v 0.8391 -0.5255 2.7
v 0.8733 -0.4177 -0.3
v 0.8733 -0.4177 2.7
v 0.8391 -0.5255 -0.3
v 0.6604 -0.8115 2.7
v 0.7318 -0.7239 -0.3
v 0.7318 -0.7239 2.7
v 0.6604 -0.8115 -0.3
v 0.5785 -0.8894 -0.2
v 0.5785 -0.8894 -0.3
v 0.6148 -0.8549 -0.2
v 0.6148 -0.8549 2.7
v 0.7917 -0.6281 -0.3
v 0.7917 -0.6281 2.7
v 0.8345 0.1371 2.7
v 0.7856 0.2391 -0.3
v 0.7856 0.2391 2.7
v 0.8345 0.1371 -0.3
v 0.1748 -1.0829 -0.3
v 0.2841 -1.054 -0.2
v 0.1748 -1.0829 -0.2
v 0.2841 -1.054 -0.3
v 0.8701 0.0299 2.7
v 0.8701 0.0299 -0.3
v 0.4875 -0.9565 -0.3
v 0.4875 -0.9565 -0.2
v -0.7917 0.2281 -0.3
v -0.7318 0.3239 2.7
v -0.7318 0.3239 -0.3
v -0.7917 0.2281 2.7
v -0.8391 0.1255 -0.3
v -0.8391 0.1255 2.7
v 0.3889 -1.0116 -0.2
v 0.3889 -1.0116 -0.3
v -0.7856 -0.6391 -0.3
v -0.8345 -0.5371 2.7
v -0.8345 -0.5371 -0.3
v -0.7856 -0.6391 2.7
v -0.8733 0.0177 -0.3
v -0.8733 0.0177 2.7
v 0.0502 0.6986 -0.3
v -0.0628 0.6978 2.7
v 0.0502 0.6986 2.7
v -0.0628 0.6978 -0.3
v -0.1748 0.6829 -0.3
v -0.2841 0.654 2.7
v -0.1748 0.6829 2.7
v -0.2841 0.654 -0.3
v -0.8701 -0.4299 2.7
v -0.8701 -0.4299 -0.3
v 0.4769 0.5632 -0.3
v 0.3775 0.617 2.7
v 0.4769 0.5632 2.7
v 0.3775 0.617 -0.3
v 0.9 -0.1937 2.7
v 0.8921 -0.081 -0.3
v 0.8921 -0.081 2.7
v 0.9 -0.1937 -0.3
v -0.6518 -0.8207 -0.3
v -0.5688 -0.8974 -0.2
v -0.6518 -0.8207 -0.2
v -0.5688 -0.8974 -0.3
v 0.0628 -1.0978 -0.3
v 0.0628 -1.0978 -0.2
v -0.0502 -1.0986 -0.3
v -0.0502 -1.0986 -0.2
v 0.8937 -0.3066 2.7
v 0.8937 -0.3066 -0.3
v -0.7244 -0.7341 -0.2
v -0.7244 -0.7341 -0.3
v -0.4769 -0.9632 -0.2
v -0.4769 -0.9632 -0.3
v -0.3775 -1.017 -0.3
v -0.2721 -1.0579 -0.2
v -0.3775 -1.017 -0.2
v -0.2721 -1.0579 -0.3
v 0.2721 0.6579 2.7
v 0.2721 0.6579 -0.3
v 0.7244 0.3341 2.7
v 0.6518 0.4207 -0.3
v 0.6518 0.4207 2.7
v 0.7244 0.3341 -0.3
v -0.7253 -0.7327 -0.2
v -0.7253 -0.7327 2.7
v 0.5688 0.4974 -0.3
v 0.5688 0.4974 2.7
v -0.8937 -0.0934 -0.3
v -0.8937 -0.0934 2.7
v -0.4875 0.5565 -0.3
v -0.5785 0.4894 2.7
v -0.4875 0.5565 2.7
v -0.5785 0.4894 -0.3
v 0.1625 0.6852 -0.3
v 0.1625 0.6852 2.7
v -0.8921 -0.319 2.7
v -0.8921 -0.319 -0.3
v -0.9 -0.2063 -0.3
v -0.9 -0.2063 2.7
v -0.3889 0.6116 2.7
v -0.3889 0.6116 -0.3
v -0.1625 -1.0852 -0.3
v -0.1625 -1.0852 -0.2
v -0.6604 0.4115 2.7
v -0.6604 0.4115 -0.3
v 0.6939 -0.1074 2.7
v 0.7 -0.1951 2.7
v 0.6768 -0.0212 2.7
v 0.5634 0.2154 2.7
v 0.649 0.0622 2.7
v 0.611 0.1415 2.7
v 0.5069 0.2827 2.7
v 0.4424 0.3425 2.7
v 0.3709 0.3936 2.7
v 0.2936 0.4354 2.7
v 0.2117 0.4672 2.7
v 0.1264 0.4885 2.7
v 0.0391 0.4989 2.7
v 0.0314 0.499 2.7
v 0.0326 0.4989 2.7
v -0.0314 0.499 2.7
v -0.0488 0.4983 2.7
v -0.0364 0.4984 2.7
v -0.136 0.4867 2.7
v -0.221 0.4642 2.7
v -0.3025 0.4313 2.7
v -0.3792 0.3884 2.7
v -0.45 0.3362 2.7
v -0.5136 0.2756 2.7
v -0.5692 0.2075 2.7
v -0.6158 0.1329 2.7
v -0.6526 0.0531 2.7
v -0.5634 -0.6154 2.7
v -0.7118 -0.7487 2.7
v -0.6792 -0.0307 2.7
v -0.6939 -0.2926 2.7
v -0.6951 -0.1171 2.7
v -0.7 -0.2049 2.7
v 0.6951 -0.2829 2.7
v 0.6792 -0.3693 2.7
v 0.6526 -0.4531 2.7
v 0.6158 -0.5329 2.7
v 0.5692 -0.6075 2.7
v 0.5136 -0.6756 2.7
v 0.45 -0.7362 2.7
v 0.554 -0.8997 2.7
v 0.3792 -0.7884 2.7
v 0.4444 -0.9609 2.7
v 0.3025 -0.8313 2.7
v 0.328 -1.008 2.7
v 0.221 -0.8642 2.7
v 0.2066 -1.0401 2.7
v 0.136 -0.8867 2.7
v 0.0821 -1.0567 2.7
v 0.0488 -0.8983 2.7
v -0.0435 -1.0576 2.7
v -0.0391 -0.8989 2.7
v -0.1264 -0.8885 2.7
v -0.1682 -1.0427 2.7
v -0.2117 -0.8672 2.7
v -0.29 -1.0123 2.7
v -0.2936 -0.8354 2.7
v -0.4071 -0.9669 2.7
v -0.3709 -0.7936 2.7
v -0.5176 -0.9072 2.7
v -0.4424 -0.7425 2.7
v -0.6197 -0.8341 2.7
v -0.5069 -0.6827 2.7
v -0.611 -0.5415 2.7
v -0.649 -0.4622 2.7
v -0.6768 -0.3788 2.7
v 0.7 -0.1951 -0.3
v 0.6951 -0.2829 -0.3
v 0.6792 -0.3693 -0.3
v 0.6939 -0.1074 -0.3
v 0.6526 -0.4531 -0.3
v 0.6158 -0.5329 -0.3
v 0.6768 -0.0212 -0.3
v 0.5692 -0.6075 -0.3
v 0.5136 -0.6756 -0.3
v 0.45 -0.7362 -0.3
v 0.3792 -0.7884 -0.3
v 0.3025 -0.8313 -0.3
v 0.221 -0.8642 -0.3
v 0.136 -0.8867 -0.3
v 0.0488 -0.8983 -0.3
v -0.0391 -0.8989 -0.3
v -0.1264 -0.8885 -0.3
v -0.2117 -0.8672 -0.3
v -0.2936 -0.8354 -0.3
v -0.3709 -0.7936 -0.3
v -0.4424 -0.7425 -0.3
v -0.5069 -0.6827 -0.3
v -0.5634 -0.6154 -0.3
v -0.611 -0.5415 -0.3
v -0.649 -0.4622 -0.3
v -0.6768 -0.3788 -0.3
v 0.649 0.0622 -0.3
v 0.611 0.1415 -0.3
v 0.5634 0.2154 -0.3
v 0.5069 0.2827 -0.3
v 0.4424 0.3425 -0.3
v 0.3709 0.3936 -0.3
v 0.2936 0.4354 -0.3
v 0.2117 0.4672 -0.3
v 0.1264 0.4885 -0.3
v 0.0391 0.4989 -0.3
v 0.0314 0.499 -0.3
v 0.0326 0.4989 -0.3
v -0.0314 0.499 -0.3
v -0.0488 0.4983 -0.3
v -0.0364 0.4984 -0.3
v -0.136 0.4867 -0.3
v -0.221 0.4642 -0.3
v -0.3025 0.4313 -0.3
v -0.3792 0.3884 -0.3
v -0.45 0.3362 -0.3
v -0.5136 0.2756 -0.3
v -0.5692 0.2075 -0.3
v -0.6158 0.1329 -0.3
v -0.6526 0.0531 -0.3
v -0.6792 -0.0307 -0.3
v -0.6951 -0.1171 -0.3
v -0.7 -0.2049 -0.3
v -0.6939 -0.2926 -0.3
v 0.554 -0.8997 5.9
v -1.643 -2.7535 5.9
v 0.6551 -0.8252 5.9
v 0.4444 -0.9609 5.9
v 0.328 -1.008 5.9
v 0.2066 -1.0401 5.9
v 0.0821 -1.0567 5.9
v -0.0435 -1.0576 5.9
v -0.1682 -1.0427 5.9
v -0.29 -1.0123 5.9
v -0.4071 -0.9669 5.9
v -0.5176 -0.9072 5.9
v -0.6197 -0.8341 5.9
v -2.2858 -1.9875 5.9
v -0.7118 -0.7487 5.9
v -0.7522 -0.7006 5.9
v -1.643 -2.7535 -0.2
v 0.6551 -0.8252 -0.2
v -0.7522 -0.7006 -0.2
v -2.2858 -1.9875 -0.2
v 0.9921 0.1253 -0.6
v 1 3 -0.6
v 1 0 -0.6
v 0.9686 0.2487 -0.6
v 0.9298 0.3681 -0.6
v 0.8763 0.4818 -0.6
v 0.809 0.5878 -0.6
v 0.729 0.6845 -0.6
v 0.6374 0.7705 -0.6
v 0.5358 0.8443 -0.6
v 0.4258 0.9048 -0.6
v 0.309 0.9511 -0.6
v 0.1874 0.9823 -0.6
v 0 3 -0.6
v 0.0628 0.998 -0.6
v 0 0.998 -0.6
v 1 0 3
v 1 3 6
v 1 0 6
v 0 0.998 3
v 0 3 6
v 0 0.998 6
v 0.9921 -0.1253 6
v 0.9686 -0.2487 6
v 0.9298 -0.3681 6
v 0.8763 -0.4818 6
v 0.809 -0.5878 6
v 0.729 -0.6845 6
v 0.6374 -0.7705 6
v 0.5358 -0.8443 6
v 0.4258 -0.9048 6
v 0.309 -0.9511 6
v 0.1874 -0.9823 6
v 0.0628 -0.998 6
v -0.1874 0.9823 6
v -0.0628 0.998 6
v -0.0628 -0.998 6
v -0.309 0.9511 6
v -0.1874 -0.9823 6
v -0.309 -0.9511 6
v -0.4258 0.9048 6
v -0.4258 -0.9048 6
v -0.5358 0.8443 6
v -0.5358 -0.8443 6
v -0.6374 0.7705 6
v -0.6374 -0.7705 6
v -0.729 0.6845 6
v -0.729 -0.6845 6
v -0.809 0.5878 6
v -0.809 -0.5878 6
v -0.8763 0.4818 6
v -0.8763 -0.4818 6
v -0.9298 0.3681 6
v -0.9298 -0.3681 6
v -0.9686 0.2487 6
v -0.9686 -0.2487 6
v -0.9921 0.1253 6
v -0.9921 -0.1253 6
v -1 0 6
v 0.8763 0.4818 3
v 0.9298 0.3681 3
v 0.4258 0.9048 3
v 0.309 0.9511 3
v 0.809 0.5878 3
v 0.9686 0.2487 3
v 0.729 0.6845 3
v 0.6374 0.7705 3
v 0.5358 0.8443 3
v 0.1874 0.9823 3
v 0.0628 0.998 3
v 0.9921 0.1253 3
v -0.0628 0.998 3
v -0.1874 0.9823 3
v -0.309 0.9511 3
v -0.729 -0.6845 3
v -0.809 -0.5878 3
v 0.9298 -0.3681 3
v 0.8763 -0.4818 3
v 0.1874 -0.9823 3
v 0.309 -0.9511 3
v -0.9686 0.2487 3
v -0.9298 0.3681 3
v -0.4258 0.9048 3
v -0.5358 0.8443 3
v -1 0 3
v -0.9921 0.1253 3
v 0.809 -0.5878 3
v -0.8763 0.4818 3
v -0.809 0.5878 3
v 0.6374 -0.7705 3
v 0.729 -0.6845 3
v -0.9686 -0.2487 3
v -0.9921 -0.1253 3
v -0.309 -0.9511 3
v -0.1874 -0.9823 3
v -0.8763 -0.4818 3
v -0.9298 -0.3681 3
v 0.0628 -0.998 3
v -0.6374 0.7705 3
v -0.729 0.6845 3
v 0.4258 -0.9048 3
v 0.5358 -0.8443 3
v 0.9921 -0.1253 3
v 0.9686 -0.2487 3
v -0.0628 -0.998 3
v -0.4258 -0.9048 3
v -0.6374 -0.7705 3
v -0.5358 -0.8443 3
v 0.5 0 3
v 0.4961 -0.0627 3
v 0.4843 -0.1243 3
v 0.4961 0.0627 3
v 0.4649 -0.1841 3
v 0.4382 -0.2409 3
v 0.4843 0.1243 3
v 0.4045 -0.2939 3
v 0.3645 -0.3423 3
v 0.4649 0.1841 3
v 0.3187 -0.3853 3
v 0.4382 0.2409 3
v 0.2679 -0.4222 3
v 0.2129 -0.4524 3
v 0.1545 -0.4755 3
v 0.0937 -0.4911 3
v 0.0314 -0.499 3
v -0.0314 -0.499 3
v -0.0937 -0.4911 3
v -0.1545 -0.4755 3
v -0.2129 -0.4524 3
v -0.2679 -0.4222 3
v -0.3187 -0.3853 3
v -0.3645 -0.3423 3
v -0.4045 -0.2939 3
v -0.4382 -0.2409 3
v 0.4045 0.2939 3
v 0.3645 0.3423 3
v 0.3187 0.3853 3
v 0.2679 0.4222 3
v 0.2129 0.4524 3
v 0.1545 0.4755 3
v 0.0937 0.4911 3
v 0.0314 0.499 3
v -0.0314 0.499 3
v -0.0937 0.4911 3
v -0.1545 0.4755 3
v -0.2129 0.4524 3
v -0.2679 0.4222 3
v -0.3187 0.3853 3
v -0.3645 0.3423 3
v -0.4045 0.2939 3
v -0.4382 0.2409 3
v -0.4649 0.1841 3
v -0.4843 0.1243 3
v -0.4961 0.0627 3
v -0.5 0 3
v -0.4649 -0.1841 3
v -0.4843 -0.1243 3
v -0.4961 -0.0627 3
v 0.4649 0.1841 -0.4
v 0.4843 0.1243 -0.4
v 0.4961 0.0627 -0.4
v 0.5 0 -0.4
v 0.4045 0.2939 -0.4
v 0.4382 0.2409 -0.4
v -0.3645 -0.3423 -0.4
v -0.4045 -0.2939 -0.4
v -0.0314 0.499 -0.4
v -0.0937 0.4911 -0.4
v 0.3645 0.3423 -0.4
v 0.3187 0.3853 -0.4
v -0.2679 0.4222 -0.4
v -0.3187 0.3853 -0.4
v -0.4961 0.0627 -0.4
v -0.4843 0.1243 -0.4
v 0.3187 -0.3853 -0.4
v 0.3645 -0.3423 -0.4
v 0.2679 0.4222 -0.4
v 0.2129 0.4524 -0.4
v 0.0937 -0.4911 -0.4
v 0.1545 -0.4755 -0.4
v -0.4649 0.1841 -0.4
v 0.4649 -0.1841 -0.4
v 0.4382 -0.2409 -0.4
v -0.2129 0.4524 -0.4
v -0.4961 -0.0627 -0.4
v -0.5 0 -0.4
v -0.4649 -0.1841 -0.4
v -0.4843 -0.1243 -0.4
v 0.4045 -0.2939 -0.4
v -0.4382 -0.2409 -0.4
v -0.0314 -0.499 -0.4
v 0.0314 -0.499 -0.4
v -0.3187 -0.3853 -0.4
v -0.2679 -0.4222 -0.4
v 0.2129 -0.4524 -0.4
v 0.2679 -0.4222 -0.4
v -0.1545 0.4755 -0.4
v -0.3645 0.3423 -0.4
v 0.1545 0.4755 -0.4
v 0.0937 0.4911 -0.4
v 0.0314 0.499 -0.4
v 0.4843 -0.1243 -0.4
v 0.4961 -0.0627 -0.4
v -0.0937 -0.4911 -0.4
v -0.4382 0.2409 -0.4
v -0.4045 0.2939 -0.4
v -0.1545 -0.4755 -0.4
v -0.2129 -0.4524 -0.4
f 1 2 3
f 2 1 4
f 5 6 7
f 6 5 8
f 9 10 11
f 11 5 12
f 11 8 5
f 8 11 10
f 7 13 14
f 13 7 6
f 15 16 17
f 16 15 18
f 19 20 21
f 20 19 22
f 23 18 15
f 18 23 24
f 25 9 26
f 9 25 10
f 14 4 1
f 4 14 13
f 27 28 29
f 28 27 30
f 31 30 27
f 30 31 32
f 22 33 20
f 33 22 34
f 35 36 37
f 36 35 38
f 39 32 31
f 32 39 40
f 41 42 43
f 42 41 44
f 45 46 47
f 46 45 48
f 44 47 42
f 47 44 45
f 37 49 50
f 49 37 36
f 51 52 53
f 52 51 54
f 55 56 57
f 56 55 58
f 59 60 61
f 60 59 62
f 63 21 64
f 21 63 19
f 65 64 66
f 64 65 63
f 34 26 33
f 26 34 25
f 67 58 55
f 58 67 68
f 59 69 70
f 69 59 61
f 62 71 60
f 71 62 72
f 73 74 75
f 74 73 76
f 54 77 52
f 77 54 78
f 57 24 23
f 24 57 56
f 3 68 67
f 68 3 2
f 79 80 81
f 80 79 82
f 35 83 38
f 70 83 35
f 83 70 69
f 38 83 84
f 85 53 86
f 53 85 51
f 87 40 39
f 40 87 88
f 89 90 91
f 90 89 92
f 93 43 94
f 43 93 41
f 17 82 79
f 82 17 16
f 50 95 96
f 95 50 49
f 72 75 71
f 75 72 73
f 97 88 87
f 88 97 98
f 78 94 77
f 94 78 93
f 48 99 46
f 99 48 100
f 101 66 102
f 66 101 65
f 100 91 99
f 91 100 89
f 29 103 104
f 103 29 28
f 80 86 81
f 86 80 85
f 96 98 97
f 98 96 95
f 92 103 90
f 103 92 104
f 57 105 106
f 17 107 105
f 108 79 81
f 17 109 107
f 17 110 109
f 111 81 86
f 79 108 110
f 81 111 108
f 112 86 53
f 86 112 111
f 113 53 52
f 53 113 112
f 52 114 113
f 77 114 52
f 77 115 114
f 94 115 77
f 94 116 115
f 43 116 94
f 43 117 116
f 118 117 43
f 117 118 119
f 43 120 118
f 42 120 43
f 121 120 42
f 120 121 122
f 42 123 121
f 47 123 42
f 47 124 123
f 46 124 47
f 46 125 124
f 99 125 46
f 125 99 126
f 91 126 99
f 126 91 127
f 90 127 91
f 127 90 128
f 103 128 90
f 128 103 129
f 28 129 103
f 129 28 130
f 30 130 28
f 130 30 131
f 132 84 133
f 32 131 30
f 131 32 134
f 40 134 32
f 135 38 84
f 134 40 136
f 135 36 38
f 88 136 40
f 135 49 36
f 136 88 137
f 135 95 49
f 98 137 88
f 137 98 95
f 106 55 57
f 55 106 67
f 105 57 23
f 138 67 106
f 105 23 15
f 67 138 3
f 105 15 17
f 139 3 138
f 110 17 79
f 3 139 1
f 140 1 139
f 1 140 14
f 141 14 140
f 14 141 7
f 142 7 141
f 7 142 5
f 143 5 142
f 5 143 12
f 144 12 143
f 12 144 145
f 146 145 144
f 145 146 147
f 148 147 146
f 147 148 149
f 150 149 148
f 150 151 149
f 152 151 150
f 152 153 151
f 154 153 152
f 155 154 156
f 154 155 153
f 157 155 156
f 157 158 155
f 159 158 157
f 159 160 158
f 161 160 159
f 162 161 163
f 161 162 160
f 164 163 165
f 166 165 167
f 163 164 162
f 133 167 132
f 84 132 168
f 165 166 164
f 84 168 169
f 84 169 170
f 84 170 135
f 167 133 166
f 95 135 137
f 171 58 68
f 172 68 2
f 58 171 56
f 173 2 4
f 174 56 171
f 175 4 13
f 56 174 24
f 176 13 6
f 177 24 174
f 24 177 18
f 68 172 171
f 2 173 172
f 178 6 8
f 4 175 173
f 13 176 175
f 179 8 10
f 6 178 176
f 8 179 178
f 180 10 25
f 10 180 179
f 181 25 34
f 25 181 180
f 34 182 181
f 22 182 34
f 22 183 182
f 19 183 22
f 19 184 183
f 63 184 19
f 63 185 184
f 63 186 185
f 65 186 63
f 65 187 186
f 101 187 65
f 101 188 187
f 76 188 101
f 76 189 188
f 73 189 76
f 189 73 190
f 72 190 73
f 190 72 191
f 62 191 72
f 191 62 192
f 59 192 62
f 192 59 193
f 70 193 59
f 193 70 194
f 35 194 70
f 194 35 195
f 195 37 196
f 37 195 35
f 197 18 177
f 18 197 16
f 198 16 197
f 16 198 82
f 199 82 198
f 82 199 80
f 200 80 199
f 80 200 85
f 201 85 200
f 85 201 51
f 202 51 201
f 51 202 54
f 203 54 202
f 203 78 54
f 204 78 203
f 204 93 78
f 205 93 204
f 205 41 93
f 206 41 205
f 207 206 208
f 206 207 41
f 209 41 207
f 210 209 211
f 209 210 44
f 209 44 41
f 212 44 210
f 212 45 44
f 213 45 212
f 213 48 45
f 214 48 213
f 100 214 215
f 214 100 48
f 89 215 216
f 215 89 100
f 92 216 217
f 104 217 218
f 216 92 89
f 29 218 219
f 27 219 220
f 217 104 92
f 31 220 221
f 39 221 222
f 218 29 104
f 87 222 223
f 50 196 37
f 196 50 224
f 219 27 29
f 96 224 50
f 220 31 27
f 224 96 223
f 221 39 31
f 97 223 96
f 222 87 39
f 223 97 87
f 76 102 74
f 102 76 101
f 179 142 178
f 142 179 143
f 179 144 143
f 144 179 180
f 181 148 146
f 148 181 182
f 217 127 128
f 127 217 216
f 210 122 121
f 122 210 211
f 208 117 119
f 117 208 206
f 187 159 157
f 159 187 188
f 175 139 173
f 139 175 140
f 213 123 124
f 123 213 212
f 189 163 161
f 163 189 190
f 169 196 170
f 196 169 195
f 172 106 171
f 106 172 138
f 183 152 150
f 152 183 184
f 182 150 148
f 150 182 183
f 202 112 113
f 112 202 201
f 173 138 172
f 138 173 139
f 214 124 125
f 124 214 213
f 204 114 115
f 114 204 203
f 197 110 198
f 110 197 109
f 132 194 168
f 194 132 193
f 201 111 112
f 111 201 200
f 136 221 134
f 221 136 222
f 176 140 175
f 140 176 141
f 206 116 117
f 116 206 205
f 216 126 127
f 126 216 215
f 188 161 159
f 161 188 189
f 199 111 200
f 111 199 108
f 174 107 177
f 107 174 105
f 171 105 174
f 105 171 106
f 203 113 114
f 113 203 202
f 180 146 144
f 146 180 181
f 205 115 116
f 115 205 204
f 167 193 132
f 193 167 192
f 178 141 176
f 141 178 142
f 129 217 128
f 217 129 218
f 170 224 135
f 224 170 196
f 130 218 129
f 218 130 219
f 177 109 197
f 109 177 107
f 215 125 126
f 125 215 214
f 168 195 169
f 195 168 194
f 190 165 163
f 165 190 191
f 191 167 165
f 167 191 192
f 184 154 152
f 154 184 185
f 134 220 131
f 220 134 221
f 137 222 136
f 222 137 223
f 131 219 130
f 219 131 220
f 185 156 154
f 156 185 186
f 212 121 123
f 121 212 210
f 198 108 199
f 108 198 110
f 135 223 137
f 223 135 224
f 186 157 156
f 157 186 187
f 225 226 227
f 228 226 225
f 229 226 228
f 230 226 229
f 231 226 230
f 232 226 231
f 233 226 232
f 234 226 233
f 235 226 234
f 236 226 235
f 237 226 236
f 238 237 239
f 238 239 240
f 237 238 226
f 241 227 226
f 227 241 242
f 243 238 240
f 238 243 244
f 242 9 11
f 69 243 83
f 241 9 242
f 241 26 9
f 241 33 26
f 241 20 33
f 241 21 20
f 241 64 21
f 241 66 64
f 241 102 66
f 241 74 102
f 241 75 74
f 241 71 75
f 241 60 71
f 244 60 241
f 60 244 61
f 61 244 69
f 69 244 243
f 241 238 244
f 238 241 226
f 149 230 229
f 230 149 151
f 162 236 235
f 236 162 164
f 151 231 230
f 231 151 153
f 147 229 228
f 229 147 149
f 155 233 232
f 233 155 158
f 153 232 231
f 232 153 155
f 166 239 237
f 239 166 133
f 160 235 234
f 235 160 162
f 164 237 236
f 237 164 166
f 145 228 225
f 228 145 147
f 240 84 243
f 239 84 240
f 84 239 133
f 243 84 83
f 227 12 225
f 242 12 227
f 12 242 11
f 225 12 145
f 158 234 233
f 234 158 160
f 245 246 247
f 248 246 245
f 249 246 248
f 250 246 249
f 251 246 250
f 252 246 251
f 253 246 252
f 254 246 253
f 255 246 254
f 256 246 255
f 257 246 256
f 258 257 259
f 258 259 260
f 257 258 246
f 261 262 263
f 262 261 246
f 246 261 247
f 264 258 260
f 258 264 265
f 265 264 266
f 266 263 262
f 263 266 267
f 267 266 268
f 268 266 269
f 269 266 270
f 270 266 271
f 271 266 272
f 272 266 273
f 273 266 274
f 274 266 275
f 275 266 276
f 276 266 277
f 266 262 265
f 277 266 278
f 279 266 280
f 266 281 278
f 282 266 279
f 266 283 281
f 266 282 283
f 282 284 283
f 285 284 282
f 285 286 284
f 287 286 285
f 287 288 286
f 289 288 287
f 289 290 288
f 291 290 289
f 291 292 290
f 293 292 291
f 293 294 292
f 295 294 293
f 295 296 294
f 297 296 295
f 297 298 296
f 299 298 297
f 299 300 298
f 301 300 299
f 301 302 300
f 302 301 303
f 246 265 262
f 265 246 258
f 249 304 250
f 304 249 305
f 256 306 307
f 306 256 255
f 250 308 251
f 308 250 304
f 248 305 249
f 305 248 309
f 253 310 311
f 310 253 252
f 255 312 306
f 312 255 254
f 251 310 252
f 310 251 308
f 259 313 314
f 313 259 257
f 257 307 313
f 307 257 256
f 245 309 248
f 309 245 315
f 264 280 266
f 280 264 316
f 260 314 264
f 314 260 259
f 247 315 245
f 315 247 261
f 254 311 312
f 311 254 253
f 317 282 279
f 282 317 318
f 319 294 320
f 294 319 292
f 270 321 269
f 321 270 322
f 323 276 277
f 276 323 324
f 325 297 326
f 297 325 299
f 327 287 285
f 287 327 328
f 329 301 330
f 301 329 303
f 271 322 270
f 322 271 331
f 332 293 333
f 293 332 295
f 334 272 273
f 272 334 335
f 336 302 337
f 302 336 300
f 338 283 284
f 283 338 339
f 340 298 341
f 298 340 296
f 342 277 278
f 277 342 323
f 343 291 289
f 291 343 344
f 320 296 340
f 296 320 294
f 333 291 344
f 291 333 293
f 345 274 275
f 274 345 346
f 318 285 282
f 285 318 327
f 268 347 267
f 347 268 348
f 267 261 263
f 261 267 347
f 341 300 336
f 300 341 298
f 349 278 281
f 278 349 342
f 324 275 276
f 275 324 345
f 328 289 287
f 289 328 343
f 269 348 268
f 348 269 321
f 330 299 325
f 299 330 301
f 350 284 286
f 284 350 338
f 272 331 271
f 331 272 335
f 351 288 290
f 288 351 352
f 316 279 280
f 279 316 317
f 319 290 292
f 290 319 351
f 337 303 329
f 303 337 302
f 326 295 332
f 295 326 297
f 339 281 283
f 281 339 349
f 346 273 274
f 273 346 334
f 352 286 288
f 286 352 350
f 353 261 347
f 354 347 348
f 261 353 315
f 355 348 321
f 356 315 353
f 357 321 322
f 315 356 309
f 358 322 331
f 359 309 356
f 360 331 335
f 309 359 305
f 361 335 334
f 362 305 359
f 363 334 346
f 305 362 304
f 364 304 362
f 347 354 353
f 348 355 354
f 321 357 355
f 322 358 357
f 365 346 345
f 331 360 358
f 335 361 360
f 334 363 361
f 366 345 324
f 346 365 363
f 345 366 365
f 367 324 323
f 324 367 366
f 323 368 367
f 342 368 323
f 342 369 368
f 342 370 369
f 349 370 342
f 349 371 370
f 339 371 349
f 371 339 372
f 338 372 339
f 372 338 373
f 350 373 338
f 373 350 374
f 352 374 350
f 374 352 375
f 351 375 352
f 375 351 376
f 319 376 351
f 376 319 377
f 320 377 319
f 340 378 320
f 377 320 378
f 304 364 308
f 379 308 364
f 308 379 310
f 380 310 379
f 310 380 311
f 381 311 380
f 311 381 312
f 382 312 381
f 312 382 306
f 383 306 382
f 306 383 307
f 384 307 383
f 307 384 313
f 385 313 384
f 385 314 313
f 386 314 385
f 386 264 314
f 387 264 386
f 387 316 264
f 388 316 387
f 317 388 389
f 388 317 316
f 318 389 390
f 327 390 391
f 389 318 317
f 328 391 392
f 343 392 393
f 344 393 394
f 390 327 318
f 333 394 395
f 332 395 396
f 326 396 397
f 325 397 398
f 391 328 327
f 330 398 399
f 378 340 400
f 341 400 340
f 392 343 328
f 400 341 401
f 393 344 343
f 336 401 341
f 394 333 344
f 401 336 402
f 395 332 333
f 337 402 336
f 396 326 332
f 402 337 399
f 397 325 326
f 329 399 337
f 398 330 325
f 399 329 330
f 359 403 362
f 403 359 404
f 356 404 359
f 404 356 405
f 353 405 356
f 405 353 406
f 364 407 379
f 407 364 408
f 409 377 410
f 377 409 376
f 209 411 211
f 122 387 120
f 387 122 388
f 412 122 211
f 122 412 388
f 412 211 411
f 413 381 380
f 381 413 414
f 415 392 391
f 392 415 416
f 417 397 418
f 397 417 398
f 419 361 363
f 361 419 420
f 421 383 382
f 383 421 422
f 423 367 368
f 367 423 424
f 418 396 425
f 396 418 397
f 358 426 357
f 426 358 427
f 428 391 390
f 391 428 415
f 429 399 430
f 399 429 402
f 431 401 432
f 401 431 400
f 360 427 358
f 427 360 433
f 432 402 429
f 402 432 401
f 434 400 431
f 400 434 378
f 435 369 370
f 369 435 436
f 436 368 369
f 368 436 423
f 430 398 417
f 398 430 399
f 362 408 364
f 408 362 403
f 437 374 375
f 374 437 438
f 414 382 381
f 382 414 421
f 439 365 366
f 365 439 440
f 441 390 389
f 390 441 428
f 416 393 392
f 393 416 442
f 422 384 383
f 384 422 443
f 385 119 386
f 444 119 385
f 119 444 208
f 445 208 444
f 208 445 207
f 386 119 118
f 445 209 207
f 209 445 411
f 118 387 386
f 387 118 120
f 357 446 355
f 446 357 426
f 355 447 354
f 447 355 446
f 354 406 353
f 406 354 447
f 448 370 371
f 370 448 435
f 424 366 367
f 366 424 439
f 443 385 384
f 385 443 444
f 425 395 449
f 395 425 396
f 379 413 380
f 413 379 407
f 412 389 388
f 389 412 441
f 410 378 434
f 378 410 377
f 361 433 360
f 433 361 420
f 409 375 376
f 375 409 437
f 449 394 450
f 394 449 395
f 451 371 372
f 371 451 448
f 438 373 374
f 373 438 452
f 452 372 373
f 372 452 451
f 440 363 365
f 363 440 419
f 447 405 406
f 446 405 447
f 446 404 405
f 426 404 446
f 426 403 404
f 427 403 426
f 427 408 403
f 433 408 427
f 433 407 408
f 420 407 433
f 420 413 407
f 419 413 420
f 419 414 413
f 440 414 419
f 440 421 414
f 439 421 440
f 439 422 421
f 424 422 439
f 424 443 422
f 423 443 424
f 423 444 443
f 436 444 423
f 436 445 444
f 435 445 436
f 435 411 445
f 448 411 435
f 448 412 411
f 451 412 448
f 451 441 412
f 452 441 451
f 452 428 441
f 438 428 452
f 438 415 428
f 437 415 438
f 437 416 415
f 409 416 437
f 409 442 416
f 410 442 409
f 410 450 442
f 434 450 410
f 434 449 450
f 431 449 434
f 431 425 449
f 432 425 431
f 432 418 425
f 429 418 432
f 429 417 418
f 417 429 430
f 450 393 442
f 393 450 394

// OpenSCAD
module block_long() { //long block
	difference(){
		cube([6.6, 3, 1]);
		
		translate([-1,0,0])
			rotate([0,270,180])
			cylinder(h=8, r=1, $fn=50);
	}
}

module block_short() { //long block
	difference(){
		cube([6.1,3,1]);
		
		translate([-1,0,0])
			rotate([0,270,180])
			cylinder(h=8, r=1, $fn=50);
	}
}

module cylinder_bottom(){
	difference(){
		cylinder(h=3, r=0.9, $fn=50);

		translate([0,0,-1])
			cylinder(h=8, r=0.7, $fn=50);
	}

	translate([-.1, .1, .1])
	rotate([0,270,180])
		block_short();
}

module cylinder_top(){

	translate([0,0,3])
		cylinder(h=3, r=1, $fn=50);
	translate([0,0,-.4]) //innder dowel
		cylinder(h=6.4, r=.5, $fn=50);

	translate([0, 0, 6])
		rotate([0,90,0])
			block_long();
//	translate([0,0,-.6])

//	cylinder(h=.2, r=1, $fn=50);
}

color("blue")
translate([0,-.2,-0.3])
	rotate([0,0, -50])
	cylinder_bottom();


cylinder_top();
